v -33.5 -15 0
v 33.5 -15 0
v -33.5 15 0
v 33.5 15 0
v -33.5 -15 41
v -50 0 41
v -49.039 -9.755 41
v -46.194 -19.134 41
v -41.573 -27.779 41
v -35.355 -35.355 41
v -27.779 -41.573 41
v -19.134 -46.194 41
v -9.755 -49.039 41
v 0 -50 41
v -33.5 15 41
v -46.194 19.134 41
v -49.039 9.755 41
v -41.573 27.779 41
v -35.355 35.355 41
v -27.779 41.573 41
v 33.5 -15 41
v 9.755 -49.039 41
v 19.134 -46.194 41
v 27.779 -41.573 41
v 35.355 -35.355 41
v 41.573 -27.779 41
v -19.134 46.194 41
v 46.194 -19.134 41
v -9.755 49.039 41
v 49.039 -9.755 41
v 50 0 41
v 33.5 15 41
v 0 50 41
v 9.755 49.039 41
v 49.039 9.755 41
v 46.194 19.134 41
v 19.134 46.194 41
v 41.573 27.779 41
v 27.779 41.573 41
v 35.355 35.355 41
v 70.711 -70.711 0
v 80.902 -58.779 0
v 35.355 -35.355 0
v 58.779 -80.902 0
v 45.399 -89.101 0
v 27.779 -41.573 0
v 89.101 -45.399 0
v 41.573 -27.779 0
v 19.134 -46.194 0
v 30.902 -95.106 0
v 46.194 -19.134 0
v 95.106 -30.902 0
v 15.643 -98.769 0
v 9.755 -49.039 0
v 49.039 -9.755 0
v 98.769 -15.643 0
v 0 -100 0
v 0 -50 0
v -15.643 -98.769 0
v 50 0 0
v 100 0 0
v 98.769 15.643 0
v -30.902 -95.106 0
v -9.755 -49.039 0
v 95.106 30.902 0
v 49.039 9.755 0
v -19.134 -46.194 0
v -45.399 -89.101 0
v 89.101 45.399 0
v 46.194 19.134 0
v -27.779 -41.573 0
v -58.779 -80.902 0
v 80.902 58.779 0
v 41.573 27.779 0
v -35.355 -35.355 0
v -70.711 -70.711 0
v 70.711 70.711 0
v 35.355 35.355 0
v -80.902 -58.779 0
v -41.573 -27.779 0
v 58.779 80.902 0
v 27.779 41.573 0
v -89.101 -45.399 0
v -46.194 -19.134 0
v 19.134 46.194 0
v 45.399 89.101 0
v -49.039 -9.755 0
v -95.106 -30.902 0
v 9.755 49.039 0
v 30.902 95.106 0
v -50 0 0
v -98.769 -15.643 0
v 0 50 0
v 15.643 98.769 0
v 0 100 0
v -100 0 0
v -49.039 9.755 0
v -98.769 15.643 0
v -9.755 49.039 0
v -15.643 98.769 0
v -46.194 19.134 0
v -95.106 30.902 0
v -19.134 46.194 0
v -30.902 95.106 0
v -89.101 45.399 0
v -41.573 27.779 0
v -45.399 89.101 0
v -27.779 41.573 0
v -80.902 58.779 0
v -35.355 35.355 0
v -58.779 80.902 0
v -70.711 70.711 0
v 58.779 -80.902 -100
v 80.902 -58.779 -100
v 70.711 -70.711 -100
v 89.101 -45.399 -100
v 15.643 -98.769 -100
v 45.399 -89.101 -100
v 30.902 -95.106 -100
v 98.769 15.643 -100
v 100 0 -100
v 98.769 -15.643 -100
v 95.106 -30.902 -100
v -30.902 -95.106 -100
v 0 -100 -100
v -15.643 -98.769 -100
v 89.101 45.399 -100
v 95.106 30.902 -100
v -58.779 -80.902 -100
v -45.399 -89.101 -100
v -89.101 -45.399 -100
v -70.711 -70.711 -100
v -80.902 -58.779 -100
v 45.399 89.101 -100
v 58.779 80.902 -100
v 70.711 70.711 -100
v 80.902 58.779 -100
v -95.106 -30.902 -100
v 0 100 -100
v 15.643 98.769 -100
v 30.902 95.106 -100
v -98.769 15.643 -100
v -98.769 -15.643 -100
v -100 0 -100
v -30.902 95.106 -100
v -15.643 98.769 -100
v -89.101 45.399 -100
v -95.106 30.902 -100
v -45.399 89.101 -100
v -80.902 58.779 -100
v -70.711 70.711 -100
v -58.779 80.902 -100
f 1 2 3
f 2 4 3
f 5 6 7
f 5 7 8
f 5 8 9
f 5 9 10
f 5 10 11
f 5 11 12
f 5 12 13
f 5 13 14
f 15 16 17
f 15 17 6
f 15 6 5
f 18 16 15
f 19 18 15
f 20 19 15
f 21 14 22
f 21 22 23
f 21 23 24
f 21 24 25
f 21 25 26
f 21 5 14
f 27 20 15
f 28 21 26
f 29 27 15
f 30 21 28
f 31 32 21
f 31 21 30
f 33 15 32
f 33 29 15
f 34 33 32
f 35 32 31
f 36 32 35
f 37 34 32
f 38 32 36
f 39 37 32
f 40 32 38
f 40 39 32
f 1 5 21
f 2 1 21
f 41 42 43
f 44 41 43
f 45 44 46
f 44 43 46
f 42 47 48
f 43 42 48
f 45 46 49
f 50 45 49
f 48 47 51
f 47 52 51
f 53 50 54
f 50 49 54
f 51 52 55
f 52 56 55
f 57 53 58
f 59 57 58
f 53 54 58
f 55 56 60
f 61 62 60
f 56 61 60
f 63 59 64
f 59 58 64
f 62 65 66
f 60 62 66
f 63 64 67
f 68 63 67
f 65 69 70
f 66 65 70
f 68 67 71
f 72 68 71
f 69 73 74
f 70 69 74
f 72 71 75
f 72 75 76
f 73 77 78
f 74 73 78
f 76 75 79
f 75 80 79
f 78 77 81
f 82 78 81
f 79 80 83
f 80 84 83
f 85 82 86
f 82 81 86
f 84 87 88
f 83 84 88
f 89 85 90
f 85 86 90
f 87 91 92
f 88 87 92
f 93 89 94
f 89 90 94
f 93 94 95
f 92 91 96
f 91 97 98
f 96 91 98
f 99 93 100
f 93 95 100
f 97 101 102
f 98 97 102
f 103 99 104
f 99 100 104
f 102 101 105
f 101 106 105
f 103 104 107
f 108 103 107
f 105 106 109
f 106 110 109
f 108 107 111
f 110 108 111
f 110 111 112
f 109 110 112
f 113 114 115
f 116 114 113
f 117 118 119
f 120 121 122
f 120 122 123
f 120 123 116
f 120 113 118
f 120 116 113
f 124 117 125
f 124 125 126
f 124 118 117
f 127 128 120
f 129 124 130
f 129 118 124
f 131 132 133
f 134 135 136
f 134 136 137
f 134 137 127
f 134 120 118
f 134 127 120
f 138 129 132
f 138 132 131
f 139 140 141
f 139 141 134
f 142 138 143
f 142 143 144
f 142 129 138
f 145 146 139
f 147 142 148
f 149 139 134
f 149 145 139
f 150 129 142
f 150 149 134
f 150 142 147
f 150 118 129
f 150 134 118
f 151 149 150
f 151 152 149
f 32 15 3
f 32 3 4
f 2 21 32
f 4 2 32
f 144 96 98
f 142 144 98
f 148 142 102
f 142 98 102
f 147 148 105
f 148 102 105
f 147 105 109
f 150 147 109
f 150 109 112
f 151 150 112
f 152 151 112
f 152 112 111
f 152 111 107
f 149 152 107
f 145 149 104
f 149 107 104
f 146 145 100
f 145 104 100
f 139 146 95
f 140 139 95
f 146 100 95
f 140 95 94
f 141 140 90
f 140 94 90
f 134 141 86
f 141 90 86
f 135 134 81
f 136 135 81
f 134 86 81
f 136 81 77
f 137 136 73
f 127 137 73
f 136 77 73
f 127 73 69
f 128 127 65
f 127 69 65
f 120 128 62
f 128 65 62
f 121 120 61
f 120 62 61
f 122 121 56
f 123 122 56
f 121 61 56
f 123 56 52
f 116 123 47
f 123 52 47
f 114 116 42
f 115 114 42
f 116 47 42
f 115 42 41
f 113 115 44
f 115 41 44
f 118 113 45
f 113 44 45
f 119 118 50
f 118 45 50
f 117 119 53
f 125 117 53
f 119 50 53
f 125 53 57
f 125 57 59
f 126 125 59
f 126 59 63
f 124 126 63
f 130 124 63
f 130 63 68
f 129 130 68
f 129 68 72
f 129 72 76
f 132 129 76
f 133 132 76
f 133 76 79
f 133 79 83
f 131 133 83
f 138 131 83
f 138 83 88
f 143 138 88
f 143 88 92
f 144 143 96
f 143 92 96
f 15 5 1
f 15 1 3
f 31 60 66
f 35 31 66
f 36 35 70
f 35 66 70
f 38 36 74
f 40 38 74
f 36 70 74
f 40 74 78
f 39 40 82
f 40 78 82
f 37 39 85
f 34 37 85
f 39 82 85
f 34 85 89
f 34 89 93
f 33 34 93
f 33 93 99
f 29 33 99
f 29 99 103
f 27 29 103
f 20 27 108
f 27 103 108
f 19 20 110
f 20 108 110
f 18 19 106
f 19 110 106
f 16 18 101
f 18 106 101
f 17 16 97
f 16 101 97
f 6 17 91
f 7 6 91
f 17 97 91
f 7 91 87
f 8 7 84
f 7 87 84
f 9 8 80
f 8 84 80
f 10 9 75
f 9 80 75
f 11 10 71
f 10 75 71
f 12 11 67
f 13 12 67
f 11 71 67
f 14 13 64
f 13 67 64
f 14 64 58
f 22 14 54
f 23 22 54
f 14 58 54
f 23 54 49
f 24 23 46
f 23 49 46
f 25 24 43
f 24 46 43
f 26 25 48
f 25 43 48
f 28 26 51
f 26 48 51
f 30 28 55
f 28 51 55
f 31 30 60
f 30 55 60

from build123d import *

# Parameters (mm, degrees)
SKETCH1_R           = 50
BOSS_EXTRUDE1_DEPTH = 41
SKETCH2_W           = 67
SKETCH2_H           = 30
CUT_EXTRUDE1_DEPTH  = 41
SKETCH3_R           = 100
BOSS_EXTRUDE2_DEPTH = 100


with BuildPart() as part:
    # Sketch1 → Boss-Extrude1 (new body)
    with BuildSketch(Plane.XY):
        Circle(SKETCH1_R)
    extrude(amount=BOSS_EXTRUDE1_DEPTH)

    # Sketch2 → Cut-Extrude1 (cut)
    with BuildSketch(Plane.XY.offset(41)):
        Rectangle(SKETCH2_W, SKETCH2_H)
    extrude(amount=-CUT_EXTRUDE1_DEPTH, mode=Mode.SUBTRACT)

    # Sketch3 → Boss-Extrude2 (add)
    with BuildSketch(Plane(origin=(0, 0, 0), x_dir=(-1, 0, 0), z_dir=(0, 0, -1))):
        Circle(SKETCH3_R)
    extrude(amount=BOSS_EXTRUDE2_DEPTH)


solid = part.part
